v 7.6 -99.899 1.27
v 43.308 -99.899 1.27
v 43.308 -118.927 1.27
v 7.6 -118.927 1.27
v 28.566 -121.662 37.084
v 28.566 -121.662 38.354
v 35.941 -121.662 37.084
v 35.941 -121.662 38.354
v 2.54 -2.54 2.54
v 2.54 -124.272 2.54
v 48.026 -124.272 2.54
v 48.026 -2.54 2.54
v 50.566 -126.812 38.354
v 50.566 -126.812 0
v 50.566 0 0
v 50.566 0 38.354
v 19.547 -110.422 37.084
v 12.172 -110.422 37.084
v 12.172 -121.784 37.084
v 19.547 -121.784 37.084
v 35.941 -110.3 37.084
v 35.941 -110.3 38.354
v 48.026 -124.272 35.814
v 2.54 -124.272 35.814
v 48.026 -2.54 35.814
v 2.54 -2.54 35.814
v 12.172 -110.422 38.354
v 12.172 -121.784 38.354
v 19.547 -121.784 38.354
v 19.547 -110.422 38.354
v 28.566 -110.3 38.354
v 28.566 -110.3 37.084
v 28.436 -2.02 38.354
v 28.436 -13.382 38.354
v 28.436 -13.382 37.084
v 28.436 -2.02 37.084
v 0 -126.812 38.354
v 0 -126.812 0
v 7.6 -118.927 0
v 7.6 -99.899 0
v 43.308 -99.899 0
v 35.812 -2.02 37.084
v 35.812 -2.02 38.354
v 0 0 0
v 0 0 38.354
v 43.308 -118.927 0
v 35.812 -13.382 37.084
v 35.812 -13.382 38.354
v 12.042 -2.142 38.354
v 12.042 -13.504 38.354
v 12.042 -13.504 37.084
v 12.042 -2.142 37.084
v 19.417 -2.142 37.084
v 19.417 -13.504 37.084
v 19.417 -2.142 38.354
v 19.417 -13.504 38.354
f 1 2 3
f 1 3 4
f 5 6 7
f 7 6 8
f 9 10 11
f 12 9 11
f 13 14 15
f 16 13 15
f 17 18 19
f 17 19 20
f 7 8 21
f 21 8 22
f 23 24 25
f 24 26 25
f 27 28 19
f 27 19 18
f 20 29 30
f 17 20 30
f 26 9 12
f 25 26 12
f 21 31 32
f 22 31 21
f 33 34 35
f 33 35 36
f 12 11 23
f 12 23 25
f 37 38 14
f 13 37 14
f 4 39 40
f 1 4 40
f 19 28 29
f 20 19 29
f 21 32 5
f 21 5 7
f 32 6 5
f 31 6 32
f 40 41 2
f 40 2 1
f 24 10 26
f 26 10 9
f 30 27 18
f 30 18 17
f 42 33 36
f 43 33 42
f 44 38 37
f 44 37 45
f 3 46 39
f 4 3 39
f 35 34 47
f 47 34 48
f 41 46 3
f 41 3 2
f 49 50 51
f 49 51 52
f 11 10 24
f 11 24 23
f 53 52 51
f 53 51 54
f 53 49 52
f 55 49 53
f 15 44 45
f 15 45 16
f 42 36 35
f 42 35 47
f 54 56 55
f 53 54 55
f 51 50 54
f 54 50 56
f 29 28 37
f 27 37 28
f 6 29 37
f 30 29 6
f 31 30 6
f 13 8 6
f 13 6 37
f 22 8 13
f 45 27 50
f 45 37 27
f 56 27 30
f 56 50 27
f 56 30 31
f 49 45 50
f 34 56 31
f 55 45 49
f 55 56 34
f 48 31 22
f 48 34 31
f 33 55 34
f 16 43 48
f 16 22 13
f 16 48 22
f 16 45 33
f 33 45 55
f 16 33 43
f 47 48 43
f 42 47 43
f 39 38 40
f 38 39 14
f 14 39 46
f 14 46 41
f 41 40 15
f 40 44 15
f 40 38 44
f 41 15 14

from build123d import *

# Parameters (mm, degrees)
SKETCH1_W           = 50.565864073
SKETCH1_H           = 126.812282012
BOSS_EXTRUDE2_DEPTH = 38.354
SHELL1_T            = 2.54
SKETCH5_W           = 7.375102077
SKETCH5_H           = 11.361908509
SKETCH5_W_2         = 7.375102076
CUT_EXTRUDE3_DEPTH  = 1.27
SKETCH8_W           = 35.70829539
SKETCH8_H           = 19.028689215
CUT_EXTRUDE4_DEPTH  = 1.27


with BuildPart() as part:
    # Sketch1 → Boss-Extrude2 (new body)
    with BuildSketch(Plane.XY):
        with Locations((25.282932037, -63.406141006)):
            Rectangle(SKETCH1_W, SKETCH1_H)
    extrude(amount=BOSS_EXTRUDE2_DEPTH)

    # Shell1 (no face opened: a closed hollow body)
    add(offset(amount=-SHELL1_T, mode=Mode.PRIVATE), mode=Mode.SUBTRACT)

    # Sketch5 → Cut-Extrude3 (cut)
    with BuildSketch(Plane.XY.offset(38.354)):
        with Locations((32.253317714, -115.98095696)):
            Rectangle(SKETCH5_W, SKETCH5_H)
        with Locations((15.859200433, -116.102649257)):
            Rectangle(SKETCH5_W_2, SKETCH5_H)
        with Locations((32.124042774, -7.70128789)):
            Rectangle(SKETCH5_W, SKETCH5_H)
        with Locations((15.729925493, -7.822980187)):
            Rectangle(SKETCH5_W_2, SKETCH5_H)
    extrude(amount=-CUT_EXTRUDE3_DEPTH, mode=Mode.SUBTRACT)

    # Sketch8 → Cut-Extrude4 (cut)
    with BuildSketch(Plane(origin=(0, 0, 0), x_dir=(-1, 0, 0), z_dir=(0, 0, -1))):
        with Locations((-25.453839923, -109.412856846)):
            Rectangle(SKETCH8_W, SKETCH8_H)
    extrude(amount=-CUT_EXTRUDE4_DEPTH, mode=Mode.SUBTRACT)


solid = part.part
